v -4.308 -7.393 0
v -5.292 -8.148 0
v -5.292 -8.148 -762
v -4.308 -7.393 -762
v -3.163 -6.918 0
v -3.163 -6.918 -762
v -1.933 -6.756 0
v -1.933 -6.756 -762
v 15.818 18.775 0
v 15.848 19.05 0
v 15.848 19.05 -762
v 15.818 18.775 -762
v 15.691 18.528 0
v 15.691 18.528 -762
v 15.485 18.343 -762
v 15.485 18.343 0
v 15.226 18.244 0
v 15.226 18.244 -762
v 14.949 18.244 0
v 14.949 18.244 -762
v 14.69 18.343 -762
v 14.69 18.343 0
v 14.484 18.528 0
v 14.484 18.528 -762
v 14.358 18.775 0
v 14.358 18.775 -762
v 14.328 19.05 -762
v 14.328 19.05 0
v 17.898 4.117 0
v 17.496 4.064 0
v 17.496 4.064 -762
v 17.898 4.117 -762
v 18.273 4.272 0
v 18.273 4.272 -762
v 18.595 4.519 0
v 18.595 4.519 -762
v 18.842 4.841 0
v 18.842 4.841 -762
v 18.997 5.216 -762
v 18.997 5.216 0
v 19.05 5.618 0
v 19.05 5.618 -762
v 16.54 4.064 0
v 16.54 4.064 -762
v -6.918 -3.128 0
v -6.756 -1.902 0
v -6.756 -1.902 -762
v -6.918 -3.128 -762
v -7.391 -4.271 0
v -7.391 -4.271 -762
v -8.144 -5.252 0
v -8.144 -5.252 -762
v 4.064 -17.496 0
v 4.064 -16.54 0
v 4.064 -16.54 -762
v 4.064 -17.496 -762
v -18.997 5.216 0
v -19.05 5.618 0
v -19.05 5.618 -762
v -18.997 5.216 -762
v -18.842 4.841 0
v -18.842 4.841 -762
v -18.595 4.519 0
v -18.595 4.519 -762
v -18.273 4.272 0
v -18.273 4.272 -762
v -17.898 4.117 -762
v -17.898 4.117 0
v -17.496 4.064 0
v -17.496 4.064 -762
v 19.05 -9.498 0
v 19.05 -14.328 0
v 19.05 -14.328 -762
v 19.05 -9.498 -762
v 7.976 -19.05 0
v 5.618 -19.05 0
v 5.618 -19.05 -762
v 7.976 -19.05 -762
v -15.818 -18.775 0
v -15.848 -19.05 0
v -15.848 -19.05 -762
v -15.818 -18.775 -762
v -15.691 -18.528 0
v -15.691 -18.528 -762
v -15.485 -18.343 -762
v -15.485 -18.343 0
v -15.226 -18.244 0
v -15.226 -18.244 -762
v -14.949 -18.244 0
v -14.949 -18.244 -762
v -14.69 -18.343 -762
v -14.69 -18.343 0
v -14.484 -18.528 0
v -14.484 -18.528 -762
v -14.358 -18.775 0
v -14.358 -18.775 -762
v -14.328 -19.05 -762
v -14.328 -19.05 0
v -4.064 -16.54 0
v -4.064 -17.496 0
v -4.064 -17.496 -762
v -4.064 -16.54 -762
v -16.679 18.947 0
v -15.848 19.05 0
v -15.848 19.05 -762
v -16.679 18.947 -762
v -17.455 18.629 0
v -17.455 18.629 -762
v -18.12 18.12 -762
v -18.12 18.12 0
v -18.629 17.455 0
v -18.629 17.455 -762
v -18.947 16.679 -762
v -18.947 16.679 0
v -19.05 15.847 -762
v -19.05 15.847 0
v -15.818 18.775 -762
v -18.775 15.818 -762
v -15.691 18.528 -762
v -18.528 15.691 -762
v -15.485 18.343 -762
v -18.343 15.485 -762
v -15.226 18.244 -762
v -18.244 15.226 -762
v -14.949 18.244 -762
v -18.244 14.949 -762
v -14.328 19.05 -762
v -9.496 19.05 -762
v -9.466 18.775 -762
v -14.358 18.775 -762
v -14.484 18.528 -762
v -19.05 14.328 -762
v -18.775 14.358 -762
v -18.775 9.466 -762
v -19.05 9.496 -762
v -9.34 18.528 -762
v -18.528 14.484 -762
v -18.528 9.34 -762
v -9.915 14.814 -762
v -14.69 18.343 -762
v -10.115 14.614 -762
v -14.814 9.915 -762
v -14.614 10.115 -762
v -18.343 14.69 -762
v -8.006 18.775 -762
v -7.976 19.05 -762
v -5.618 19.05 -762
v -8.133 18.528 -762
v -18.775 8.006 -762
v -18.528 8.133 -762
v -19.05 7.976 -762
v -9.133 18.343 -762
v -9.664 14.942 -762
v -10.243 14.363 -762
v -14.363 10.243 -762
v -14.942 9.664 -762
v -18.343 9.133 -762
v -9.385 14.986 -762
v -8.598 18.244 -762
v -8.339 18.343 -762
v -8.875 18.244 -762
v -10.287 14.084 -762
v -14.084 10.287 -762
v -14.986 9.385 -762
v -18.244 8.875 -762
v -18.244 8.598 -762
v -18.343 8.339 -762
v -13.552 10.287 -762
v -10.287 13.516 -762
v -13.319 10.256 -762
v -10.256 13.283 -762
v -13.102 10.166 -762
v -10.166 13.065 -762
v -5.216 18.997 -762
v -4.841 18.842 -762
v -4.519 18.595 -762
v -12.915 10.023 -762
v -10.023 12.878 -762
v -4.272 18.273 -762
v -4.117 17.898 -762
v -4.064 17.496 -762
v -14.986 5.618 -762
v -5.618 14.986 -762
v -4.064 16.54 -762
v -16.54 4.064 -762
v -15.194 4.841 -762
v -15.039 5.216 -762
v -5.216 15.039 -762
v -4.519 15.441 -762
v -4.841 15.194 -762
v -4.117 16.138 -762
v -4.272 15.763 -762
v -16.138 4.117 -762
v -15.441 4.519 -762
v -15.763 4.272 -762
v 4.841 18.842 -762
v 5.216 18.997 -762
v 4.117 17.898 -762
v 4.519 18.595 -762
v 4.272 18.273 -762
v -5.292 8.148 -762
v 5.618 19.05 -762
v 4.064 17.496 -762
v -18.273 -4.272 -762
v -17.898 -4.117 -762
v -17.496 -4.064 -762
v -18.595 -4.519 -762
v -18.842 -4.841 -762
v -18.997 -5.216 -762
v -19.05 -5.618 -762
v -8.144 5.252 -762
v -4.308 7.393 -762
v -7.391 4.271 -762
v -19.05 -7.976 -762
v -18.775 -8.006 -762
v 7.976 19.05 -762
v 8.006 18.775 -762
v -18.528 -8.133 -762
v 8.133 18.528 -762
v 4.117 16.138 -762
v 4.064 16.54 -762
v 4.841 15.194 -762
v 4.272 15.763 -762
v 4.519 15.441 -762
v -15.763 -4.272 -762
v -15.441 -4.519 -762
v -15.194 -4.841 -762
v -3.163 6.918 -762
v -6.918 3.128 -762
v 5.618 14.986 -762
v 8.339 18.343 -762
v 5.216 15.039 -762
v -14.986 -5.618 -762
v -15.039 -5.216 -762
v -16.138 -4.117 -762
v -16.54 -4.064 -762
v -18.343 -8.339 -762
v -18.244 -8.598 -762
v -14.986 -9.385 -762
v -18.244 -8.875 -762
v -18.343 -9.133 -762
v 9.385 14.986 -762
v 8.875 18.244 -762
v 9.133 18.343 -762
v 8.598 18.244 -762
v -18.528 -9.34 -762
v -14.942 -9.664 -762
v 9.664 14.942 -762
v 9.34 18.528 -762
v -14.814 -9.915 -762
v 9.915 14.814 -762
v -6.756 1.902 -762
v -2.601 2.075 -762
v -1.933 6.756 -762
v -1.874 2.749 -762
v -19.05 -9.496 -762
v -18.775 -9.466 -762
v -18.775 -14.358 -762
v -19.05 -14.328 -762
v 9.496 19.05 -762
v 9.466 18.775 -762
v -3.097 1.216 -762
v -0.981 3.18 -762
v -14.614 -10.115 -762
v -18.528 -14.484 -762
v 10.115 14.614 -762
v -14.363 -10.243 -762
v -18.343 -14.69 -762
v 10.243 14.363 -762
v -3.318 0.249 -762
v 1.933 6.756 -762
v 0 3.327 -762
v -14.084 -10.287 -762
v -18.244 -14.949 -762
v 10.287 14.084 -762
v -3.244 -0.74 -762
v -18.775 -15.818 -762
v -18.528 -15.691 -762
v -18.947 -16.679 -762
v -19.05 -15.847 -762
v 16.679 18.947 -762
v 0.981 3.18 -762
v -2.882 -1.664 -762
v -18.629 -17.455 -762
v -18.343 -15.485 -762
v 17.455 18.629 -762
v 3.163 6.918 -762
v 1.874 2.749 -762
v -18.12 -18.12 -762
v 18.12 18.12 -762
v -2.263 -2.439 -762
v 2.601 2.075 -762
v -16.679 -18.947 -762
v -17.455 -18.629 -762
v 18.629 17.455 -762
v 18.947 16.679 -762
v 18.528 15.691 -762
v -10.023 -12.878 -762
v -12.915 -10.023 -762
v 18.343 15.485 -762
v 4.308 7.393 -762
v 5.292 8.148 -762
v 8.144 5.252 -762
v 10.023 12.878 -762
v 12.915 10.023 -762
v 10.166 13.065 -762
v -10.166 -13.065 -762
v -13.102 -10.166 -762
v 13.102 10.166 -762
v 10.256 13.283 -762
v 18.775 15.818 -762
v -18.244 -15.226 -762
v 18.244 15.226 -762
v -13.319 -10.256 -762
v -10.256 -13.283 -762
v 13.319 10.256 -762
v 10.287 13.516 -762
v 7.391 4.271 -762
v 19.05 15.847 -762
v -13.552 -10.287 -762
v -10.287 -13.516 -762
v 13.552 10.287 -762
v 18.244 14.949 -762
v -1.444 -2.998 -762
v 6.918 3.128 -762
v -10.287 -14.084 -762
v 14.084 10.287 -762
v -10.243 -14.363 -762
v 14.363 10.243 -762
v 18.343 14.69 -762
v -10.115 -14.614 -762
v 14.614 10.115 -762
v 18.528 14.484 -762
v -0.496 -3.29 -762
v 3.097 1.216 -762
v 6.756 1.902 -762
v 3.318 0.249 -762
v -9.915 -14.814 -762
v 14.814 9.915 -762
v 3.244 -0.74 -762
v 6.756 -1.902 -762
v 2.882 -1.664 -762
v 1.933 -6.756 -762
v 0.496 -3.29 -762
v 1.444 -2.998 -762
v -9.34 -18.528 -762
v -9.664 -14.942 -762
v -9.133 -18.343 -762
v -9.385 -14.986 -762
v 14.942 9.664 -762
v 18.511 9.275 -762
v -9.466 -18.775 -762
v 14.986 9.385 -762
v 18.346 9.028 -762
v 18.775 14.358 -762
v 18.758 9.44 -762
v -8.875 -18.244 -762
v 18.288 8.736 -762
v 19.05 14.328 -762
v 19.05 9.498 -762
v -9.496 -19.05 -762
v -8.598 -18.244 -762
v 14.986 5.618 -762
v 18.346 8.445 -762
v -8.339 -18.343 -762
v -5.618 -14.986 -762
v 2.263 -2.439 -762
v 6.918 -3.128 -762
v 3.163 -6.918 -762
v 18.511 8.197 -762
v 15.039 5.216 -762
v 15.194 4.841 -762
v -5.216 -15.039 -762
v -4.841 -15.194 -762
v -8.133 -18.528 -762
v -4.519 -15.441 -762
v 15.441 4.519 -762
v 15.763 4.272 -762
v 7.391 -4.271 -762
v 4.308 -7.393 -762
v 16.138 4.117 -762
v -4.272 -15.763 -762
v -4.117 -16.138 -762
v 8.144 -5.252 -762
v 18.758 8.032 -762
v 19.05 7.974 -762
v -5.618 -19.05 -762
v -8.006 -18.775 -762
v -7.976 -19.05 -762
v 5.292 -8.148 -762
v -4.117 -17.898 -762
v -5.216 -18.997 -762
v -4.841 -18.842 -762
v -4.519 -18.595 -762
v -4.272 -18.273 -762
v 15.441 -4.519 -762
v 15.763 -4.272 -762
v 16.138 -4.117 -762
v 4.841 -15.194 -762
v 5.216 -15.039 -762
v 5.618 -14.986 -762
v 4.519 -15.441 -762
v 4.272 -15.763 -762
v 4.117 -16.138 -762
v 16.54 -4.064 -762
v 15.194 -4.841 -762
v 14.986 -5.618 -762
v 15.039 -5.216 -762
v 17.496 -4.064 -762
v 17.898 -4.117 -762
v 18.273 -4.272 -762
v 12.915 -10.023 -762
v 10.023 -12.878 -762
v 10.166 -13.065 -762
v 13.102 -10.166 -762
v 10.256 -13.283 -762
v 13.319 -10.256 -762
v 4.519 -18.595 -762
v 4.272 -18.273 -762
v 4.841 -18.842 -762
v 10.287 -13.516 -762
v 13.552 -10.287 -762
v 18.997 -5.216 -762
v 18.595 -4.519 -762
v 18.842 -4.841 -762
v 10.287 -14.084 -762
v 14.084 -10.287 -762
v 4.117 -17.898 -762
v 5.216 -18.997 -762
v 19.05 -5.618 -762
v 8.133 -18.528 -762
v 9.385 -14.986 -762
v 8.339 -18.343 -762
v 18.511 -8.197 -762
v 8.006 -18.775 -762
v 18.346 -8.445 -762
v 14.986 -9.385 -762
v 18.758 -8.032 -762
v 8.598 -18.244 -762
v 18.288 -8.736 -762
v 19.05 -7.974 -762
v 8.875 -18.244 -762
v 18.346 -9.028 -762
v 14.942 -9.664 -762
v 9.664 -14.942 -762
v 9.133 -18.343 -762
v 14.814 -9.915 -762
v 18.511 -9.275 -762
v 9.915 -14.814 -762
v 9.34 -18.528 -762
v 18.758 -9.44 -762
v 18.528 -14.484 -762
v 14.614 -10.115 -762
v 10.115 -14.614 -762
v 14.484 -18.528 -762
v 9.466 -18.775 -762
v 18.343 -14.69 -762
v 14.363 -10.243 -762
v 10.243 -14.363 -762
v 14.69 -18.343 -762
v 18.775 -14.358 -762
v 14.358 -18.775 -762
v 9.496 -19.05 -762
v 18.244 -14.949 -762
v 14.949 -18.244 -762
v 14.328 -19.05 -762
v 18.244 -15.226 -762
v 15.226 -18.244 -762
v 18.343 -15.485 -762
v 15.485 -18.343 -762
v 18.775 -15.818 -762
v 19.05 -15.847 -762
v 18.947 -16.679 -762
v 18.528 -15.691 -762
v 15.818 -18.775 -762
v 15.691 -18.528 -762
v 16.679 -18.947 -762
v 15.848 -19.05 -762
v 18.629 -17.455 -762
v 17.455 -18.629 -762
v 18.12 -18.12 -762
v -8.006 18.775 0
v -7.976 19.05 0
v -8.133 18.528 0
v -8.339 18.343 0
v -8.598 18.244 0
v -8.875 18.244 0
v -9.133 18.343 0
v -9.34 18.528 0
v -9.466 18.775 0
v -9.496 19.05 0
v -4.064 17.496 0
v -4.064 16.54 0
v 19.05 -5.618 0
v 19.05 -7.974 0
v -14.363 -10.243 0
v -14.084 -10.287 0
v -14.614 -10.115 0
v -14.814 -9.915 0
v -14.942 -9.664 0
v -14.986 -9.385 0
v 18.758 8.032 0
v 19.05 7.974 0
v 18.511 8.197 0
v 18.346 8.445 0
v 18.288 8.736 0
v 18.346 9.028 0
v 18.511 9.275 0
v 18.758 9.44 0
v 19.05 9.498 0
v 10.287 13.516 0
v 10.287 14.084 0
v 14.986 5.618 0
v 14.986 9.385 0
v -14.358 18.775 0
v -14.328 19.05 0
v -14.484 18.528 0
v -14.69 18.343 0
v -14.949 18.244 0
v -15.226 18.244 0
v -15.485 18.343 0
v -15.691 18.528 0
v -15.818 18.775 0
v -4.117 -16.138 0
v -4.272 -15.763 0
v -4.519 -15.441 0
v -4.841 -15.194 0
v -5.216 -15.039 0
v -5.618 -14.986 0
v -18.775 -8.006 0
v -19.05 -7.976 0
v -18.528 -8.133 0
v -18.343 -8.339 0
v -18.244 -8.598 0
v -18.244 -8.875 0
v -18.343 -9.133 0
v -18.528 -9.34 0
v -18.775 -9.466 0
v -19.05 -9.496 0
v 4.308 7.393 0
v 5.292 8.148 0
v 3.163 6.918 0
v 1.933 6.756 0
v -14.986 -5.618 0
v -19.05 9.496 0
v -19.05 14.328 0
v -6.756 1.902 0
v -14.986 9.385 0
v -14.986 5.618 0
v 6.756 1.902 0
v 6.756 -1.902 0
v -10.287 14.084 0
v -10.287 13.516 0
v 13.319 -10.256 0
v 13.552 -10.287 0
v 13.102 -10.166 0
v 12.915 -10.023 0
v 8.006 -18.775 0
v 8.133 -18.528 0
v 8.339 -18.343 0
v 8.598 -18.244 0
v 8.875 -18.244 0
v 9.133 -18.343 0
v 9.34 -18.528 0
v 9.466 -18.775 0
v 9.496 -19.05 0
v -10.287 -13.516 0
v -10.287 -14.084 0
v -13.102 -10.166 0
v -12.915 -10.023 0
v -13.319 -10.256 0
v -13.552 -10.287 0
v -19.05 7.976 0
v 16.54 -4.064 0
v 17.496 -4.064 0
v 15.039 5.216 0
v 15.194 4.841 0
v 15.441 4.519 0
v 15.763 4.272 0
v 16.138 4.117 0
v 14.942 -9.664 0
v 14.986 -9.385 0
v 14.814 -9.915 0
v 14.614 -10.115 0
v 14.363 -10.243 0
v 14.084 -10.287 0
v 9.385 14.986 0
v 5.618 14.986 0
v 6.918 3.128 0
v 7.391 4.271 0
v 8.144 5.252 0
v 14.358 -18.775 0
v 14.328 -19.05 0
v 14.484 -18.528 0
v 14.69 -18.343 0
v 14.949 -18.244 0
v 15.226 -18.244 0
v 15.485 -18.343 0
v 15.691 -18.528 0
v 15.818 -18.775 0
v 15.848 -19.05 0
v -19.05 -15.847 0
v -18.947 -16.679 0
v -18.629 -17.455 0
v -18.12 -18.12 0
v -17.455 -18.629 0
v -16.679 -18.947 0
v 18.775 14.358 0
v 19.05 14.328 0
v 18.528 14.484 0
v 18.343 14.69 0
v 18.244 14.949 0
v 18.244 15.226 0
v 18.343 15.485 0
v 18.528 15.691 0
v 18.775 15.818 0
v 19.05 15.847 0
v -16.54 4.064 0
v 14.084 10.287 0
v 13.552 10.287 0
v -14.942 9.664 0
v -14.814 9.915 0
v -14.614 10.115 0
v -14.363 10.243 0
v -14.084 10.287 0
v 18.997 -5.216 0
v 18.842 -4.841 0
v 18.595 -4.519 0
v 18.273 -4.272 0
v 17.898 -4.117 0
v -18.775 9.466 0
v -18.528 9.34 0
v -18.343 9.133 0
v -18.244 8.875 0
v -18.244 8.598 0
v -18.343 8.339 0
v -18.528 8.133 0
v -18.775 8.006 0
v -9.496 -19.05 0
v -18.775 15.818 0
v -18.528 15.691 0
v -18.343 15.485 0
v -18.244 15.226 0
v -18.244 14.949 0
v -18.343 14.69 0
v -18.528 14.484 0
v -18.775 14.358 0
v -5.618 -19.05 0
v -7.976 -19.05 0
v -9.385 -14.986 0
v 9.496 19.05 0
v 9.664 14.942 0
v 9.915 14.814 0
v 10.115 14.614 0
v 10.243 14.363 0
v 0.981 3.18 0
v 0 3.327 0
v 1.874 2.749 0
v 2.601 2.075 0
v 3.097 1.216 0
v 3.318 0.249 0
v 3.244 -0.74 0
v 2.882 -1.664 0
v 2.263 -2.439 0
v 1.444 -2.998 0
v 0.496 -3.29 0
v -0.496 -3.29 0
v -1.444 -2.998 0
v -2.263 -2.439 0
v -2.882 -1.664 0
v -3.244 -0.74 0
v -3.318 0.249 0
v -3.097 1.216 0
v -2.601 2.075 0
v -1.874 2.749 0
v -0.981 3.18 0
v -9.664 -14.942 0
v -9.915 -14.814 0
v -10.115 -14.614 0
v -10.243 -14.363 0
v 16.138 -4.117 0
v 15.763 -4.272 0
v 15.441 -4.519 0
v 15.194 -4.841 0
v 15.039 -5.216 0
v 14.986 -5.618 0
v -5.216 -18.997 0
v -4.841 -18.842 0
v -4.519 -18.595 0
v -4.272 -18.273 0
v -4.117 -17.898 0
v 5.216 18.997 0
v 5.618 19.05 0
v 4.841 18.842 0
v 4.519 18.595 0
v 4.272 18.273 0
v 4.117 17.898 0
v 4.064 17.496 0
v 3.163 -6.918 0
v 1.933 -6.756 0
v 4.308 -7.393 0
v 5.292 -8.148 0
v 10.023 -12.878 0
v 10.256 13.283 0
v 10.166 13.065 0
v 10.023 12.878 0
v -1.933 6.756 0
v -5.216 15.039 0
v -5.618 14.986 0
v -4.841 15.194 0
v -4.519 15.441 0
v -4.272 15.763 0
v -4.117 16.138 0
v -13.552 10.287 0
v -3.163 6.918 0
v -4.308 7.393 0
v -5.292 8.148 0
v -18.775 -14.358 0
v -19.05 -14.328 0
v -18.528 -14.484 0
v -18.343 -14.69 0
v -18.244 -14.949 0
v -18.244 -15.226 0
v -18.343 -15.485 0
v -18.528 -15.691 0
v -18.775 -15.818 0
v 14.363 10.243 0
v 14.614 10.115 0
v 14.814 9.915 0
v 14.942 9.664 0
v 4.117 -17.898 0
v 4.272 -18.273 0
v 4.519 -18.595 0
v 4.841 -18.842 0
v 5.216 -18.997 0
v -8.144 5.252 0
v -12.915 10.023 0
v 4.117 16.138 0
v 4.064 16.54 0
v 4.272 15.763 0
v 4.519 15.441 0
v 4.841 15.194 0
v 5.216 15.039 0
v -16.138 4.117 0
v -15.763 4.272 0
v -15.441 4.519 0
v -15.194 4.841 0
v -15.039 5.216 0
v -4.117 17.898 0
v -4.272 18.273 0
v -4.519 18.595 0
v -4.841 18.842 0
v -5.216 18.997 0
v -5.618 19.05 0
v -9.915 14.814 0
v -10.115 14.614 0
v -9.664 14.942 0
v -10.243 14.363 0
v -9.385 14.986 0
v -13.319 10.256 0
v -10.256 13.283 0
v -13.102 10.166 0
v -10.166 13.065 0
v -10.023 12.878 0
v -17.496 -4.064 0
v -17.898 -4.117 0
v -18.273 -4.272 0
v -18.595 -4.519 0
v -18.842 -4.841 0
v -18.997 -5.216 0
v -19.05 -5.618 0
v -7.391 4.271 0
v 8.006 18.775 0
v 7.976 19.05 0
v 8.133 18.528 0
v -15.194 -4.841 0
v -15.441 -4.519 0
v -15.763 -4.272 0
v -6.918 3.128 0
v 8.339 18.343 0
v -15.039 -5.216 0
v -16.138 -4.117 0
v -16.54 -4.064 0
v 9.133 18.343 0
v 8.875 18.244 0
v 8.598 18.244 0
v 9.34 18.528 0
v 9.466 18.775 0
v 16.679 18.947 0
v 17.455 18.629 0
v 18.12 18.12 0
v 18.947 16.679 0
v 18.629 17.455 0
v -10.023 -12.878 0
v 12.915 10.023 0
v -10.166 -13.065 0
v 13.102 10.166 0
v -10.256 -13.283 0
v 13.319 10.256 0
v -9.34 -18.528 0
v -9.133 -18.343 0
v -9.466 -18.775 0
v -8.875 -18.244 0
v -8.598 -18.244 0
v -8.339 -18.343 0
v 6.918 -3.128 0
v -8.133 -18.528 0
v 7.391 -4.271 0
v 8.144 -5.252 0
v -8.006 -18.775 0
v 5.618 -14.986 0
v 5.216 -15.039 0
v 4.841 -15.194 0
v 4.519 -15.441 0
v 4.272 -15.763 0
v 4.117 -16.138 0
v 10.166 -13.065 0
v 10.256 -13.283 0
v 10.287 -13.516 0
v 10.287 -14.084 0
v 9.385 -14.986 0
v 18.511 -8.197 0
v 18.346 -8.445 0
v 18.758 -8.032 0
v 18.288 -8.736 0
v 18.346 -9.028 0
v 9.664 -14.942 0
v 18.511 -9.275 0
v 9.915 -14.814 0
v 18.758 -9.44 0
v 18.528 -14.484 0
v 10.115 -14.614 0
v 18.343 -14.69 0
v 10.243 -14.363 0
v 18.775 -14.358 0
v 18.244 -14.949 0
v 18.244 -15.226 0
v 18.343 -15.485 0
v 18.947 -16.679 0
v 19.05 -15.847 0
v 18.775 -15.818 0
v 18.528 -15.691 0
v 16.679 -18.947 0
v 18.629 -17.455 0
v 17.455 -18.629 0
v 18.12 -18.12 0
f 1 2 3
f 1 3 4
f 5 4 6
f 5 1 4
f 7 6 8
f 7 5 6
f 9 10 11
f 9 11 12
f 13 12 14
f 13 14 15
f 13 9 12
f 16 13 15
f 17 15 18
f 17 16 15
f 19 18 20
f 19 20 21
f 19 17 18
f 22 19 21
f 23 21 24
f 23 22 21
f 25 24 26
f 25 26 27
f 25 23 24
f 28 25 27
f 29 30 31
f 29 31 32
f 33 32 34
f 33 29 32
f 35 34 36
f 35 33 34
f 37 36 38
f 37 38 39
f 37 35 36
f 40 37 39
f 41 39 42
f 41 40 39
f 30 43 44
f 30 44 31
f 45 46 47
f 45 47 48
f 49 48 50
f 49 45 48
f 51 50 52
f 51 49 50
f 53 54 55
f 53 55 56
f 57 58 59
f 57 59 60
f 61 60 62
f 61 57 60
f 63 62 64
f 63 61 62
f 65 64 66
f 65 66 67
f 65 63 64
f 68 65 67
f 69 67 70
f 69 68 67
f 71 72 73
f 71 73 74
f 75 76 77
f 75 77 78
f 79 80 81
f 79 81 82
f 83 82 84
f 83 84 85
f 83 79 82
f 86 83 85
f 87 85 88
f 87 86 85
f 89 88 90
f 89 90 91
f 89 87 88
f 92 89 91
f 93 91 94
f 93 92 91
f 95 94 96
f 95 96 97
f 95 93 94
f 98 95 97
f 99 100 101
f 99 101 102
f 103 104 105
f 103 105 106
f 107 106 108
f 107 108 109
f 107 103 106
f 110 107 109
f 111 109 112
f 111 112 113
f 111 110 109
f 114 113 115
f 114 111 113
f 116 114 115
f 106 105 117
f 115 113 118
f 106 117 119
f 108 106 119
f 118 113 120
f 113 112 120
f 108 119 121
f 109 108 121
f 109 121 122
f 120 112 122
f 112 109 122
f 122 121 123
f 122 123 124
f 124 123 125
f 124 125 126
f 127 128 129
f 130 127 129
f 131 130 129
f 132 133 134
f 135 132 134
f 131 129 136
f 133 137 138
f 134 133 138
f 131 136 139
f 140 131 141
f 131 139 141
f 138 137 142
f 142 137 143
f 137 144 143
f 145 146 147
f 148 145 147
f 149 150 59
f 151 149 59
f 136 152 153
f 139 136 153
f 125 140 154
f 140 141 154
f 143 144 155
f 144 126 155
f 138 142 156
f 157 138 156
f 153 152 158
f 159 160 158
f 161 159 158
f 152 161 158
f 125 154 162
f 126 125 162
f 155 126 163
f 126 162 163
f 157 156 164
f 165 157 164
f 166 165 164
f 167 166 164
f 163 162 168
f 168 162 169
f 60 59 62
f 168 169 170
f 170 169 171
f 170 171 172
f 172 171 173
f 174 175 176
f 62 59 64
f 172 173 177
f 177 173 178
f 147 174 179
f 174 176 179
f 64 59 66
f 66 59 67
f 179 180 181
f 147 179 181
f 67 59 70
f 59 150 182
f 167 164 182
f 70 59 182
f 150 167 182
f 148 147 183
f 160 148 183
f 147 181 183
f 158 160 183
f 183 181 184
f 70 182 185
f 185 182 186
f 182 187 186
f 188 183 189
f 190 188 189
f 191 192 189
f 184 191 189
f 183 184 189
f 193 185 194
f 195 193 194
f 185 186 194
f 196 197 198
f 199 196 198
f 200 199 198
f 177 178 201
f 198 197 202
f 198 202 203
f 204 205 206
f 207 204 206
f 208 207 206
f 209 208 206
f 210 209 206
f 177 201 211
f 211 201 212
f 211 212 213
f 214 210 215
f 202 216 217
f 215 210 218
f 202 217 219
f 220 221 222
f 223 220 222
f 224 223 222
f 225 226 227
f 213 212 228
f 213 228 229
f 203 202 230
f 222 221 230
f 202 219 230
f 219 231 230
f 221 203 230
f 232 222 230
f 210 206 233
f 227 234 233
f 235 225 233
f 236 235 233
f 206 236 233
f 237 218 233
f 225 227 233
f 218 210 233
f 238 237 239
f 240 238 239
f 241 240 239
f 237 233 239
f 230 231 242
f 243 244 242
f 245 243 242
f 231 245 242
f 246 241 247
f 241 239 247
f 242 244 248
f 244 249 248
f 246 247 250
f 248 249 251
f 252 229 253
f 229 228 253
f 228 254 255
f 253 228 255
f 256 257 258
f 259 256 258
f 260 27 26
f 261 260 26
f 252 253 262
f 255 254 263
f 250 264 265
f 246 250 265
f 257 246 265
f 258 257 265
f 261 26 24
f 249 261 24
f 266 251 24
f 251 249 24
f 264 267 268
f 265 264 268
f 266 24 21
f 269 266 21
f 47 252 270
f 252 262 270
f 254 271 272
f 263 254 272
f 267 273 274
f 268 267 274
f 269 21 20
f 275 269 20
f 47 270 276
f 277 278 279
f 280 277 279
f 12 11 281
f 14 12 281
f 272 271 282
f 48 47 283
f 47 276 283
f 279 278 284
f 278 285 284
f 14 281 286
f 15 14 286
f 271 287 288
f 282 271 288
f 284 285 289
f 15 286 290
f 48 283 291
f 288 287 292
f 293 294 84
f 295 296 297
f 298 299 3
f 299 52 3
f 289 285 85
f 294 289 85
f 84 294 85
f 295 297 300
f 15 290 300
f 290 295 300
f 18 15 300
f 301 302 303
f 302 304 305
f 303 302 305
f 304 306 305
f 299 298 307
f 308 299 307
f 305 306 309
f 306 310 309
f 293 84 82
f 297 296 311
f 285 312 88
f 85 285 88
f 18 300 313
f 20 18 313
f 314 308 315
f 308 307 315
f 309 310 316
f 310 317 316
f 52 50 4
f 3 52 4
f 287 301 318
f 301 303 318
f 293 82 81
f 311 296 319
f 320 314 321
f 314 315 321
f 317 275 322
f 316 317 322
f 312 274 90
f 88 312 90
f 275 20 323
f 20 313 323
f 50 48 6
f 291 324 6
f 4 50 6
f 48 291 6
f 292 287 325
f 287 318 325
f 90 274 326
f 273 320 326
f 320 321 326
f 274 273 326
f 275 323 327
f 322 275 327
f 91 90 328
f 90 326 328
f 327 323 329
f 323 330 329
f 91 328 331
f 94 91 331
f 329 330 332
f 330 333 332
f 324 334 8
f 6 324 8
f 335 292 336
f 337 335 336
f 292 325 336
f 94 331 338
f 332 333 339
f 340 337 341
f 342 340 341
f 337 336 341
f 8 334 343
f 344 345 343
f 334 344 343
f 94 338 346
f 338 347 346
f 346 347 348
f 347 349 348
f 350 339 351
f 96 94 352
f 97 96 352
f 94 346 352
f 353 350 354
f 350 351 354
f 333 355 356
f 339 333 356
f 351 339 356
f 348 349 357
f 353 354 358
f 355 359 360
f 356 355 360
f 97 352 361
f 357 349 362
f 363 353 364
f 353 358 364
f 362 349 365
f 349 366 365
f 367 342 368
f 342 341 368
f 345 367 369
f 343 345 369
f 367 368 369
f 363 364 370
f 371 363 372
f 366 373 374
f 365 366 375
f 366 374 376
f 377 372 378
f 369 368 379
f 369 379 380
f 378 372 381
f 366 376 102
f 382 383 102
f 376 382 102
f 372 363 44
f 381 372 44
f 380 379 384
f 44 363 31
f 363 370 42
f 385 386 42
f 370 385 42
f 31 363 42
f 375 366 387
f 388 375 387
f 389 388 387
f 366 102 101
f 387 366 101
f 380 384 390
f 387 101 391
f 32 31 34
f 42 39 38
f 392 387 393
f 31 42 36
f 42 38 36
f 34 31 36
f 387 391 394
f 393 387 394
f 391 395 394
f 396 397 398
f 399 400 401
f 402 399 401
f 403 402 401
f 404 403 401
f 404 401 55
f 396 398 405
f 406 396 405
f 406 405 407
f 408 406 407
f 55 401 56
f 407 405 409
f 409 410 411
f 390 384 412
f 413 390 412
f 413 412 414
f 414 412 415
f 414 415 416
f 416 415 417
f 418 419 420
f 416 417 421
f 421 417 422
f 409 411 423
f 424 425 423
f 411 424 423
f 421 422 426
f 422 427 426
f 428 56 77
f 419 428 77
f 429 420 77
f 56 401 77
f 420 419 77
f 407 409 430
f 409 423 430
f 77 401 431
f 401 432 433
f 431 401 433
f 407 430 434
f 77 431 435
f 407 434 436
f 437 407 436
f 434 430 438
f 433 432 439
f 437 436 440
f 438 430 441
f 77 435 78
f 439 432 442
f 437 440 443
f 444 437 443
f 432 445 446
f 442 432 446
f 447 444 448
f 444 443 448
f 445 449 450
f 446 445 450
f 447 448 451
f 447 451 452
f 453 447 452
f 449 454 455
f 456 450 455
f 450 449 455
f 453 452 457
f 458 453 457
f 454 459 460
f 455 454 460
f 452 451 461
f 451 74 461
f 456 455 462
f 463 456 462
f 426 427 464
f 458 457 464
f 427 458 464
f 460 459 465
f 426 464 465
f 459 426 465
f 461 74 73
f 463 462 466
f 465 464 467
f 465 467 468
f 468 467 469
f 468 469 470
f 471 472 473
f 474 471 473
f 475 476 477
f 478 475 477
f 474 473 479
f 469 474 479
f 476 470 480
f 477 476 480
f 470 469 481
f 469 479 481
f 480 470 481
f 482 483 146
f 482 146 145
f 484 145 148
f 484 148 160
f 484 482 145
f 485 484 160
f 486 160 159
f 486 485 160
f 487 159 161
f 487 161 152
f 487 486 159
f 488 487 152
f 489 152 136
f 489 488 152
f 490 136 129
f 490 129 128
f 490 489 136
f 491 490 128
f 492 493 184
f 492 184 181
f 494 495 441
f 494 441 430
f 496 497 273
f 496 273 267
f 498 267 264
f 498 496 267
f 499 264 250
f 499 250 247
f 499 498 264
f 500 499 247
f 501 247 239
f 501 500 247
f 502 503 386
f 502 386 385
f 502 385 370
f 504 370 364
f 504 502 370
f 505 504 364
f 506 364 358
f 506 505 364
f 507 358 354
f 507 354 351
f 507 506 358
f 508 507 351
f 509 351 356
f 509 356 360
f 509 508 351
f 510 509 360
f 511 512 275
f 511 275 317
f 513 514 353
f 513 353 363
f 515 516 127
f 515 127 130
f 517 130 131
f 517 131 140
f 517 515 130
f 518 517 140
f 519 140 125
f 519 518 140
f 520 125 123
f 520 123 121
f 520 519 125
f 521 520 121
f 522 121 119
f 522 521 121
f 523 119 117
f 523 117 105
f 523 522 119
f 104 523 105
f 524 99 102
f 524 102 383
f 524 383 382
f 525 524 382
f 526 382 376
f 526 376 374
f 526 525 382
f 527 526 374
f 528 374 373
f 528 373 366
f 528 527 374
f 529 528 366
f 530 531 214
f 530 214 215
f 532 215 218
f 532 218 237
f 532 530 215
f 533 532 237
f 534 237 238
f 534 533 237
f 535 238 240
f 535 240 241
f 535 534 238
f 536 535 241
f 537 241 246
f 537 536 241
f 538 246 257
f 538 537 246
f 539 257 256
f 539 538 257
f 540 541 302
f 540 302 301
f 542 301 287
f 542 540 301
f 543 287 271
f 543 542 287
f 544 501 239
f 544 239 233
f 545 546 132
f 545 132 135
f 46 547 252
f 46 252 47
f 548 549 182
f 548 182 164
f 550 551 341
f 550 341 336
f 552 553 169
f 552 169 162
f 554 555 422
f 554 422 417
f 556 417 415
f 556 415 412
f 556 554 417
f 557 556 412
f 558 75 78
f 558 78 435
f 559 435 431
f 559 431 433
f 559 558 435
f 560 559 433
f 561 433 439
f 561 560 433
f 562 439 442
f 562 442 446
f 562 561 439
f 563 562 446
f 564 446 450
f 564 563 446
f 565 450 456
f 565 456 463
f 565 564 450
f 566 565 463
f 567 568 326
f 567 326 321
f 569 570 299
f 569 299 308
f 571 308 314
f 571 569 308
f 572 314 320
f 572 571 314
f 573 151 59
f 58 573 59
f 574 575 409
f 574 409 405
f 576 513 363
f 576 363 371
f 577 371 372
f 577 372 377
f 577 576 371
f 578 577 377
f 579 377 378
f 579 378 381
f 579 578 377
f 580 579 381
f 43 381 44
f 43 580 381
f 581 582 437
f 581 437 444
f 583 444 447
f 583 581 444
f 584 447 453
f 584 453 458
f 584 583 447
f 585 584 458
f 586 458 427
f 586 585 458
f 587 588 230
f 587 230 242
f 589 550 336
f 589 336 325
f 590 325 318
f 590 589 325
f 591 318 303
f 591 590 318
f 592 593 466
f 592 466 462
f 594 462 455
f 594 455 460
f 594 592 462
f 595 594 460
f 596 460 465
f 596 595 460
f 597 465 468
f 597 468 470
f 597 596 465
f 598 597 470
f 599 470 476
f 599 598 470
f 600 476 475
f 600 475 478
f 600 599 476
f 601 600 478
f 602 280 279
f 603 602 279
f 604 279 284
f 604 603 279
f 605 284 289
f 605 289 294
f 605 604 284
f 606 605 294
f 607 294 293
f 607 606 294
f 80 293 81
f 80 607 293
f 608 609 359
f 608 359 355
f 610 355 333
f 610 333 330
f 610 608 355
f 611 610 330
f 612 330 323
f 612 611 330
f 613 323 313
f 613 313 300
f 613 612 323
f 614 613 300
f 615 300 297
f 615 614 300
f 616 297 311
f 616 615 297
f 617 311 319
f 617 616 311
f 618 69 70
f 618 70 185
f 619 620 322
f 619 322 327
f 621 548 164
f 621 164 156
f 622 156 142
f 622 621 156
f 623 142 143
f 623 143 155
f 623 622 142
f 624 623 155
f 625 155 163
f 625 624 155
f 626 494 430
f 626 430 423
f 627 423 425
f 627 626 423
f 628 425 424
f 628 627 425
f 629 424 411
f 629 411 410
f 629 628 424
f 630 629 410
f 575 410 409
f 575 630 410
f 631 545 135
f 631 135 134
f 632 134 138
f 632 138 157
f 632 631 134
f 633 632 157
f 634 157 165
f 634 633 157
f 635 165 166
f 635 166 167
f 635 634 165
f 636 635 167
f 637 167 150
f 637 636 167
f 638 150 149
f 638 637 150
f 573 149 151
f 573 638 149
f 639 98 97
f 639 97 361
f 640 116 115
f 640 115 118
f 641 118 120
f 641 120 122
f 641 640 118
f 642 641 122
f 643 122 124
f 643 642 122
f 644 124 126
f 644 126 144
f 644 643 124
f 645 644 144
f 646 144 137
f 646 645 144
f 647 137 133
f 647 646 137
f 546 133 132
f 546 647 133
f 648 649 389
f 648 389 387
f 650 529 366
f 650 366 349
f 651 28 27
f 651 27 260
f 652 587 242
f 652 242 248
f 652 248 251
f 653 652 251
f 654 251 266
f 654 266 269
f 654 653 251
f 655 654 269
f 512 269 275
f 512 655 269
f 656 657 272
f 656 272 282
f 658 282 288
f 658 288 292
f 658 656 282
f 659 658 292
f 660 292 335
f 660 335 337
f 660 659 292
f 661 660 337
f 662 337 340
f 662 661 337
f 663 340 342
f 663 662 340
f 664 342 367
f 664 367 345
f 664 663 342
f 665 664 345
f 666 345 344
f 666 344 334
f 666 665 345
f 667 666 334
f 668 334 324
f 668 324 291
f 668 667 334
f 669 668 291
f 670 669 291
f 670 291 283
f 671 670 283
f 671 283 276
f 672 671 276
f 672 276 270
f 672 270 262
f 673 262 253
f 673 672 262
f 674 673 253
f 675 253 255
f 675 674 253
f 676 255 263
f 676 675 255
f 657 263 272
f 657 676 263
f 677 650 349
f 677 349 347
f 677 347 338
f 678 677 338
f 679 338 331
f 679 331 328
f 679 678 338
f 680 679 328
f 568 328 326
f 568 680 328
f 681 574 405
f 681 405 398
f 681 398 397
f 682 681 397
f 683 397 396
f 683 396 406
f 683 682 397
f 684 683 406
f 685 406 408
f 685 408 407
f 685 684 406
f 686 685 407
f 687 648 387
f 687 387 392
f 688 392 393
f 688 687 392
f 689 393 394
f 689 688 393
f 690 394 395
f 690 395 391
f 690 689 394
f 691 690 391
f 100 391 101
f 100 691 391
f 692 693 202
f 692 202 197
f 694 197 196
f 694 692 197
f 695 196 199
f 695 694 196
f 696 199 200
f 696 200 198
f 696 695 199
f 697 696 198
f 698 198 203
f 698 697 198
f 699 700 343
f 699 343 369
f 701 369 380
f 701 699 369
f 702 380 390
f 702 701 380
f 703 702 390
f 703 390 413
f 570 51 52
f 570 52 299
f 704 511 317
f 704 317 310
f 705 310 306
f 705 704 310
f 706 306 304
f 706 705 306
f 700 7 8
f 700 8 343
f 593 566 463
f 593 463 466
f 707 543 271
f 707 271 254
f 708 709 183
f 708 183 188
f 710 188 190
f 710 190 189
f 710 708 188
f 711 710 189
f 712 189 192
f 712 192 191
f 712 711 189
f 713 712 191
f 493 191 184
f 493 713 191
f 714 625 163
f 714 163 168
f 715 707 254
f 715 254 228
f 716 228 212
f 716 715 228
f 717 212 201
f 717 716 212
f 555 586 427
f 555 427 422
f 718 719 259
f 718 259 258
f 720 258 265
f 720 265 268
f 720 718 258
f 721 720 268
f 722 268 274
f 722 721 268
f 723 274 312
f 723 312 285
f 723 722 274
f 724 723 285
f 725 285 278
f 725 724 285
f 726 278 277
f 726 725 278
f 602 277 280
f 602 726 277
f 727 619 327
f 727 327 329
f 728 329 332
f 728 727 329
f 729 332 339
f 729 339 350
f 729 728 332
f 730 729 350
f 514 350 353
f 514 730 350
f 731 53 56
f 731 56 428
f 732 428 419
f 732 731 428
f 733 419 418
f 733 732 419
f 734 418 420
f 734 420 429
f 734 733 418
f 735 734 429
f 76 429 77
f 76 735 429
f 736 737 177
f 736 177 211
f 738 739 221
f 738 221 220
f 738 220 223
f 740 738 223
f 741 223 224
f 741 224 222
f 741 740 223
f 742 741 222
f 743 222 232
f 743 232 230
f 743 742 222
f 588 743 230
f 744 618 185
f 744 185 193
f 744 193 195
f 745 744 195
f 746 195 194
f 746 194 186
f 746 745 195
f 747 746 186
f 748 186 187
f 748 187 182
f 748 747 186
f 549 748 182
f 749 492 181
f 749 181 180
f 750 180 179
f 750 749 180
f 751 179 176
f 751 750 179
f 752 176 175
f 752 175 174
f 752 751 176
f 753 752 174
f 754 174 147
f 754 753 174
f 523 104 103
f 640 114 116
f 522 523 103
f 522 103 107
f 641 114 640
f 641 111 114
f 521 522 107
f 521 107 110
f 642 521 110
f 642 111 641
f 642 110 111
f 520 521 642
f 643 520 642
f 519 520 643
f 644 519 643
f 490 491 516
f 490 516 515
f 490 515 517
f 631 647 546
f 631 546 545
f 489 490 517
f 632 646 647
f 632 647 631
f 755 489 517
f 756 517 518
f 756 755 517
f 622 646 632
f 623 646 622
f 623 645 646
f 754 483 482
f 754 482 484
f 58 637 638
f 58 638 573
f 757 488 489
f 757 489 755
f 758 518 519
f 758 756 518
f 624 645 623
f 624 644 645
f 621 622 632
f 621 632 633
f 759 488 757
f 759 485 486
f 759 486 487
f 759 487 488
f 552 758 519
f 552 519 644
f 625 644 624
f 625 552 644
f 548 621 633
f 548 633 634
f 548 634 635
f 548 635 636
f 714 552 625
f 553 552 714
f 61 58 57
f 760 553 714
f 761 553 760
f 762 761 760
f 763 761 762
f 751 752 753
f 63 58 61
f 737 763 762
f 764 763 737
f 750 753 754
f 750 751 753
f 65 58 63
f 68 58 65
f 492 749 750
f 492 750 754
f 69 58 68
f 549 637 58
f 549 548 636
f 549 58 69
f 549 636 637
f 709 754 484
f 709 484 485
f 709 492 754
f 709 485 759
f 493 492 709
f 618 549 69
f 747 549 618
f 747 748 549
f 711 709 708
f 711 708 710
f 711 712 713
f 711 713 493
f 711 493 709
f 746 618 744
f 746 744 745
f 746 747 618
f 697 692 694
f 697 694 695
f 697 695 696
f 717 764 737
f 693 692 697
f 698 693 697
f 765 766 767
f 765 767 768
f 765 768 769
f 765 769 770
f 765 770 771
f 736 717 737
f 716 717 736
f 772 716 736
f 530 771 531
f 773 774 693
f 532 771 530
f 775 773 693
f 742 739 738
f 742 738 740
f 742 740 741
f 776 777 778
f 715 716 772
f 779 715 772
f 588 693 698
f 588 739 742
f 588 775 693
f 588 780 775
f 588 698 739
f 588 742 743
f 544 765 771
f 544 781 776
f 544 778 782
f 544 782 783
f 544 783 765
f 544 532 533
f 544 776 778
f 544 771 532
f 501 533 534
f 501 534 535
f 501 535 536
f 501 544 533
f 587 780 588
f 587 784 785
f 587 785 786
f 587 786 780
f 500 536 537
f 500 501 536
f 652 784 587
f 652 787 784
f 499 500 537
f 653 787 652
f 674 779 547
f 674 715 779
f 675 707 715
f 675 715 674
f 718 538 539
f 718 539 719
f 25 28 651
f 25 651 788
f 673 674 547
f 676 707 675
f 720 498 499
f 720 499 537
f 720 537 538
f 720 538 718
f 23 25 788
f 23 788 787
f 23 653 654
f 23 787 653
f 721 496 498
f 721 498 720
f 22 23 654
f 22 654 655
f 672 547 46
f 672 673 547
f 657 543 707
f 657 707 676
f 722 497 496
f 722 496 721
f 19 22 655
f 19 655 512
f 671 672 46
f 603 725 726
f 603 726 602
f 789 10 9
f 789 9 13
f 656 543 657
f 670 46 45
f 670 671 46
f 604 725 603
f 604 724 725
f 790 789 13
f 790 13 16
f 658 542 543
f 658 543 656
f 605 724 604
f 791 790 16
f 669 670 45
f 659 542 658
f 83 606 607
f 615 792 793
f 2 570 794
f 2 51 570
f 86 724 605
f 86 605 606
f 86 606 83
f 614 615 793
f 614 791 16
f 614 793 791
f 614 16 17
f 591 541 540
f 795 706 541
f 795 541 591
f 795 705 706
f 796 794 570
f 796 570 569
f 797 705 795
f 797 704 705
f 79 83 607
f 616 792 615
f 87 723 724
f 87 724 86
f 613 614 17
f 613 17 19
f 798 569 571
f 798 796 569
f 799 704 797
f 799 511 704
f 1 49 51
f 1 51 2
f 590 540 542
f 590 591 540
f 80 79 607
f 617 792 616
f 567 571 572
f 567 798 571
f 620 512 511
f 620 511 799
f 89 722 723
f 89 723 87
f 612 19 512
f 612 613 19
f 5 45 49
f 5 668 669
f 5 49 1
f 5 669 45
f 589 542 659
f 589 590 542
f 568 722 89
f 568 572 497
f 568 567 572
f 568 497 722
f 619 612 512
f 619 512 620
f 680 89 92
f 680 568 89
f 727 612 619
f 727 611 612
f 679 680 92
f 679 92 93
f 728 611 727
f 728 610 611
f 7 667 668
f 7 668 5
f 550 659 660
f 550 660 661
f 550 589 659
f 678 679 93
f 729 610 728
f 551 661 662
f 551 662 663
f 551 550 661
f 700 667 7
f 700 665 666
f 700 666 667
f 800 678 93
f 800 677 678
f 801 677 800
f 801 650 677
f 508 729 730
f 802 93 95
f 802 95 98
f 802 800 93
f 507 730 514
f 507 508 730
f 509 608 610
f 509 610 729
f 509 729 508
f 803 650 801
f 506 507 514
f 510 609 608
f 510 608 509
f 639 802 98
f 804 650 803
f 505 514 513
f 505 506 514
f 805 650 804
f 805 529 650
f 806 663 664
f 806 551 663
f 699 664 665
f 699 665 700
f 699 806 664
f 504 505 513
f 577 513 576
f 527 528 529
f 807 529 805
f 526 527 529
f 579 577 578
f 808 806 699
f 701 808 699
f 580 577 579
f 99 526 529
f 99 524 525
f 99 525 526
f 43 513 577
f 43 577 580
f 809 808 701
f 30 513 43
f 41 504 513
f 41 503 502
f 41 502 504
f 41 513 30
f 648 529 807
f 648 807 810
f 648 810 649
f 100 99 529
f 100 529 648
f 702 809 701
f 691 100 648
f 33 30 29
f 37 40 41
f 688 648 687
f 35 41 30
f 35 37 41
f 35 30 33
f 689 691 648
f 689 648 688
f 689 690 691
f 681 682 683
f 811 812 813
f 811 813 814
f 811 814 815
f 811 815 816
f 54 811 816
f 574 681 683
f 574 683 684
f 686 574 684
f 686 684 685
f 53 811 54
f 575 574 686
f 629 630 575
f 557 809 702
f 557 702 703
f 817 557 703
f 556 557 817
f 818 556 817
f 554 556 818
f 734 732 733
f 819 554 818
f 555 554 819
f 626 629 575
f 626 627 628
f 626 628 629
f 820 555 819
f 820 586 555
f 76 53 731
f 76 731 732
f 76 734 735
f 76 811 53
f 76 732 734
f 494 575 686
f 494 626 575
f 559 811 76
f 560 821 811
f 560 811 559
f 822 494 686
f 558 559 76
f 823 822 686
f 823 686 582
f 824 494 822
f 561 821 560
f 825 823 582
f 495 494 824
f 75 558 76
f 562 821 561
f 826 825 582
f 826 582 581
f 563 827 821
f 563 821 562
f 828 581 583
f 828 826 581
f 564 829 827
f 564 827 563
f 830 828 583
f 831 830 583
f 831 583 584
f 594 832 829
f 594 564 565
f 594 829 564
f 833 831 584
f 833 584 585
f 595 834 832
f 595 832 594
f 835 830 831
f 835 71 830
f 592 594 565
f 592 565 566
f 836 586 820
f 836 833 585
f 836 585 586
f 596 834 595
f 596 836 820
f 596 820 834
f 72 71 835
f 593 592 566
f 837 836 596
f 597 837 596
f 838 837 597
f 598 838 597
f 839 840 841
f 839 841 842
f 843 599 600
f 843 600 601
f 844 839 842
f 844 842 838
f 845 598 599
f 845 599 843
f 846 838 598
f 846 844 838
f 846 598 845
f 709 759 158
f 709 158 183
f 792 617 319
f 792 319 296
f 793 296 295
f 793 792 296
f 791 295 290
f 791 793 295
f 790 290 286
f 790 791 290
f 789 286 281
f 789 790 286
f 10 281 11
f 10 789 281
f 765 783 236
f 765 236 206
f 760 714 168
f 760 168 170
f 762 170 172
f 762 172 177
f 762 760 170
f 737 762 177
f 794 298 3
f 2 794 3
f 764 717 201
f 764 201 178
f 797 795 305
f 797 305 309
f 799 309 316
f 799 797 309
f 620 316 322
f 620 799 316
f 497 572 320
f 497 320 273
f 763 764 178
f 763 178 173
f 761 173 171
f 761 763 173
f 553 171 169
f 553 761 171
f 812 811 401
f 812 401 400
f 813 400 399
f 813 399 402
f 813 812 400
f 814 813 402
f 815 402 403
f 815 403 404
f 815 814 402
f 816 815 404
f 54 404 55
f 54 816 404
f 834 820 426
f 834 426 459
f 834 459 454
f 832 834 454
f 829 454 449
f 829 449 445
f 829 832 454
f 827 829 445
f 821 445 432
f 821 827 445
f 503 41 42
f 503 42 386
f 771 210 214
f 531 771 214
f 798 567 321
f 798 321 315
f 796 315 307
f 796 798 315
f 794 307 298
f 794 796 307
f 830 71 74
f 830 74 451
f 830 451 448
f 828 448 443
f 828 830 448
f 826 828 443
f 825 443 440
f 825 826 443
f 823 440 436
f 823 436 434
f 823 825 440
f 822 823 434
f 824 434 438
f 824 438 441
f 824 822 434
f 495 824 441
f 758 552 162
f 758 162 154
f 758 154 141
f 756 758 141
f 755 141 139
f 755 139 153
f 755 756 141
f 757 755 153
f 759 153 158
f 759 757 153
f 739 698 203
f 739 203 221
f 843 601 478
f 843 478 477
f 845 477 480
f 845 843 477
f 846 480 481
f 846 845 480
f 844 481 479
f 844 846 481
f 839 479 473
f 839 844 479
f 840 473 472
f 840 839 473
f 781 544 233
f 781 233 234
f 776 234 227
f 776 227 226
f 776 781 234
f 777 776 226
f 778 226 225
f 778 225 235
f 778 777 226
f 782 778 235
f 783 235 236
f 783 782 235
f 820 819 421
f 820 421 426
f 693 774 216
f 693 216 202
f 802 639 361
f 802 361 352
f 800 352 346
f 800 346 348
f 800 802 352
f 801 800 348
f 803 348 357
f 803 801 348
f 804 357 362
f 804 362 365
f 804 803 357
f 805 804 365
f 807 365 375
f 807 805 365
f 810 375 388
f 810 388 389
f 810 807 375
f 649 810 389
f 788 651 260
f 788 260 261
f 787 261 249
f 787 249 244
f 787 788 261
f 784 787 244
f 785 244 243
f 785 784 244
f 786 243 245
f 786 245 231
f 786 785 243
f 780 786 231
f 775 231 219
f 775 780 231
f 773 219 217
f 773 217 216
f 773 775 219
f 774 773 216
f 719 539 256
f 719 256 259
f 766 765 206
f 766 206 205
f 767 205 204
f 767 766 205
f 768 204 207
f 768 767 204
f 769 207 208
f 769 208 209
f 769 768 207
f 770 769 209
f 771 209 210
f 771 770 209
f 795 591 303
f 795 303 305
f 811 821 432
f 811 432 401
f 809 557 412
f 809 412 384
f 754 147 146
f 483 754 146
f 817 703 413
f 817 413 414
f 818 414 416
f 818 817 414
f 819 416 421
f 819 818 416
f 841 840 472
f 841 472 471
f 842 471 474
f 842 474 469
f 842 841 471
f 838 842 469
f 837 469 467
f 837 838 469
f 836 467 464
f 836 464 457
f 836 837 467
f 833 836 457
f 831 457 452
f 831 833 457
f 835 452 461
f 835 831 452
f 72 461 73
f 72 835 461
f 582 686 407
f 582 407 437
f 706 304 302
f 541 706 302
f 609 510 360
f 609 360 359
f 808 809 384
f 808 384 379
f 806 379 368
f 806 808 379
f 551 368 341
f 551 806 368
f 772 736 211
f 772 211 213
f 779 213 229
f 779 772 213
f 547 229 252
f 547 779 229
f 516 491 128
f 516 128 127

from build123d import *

# Parameters (mm, degrees)
SKETCH11_R                = 3.3274
F_15_1515_PROFILE_1_DEPTH = 762


with BuildPart() as part:
    # Sketch11 → 15 1515 PROFILE(1) (new body)
    with BuildSketch(Plane.YX):
        with BuildLine():
            Line((-10.022898969, 12.91475973), (-5.252158105, 8.144007132))
            ThreePointArc((-5.252158105, 8.144007132), (-3.715177372, 7.117027388), (-1.902183975, 6.7564))
            Line((-1.902183975, 6.7564), (1.902183975, 6.7564))
            ThreePointArc((1.902183975, 6.7564), (3.715177372, 7.117027388), (5.252158105, 8.144007132))
            Line((5.252158105, 8.144007132), (10.022898969, 12.91475973))
            ThreePointArc((10.022898969, 12.91475973), (10.218362387, 13.207291992), (10.287, 13.552357131))
            Line((10.287, 13.552357131), (10.287, 14.0843))
            ThreePointArc((10.287, 14.0843), (10.022898185, 14.721898185), (9.3853, 14.986))
            Line((9.3853, 14.986), (5.617617549, 14.986))
            ThreePointArc((5.617617549, 14.986), (4.519044045, 15.441044045), (4.064, 16.539617549))
            Line((4.064, 16.539617549), (4.064, 17.496382451))
            ThreePointArc((4.064, 17.496382451), (4.519044045, 18.594955955), (5.617617549, 19.05))
            Line((5.617617549, 19.05), (7.974178704, 19.05))
            ThreePointArc((7.974178704, 19.05), (8.736178704, 18.288), (9.498178704, 19.05))
            Line((9.498178704, 19.05), (14.327719207, 19.05))
            ThreePointArc((14.327719207, 19.05), (15.087603123, 18.231251131), (15.847487039, 19.05))
            ThreePointArc((15.847487039, 19.05), (18.120176289, 18.120192083), (19.05, 15.847509295))
            ThreePointArc((19.05, 15.847509295), (18.231250992, 15.08762539), (19.05, 14.327741484))
            Line((19.05, 14.327741484), (19.05, 9.496091471))
            ThreePointArc((19.05, 9.496091471), (18.231250992, 8.736207565), (19.05, 7.97632366))
            Line((19.05, 7.97632366), (19.05, 5.617617549))
            ThreePointArc((19.05, 5.617617549), (18.594955955, 4.519044045), (17.496382451, 4.064))
            Line((17.496382451, 4.064), (16.539617549, 4.064))
            ThreePointArc((16.539617549, 4.064), (15.441044045, 4.519044045), (14.986, 5.617617549))
            Line((14.986, 5.617617549), (14.986, 9.385342516))
            ThreePointArc((14.986, 9.385342516), (14.721898185, 10.022940701), (14.0843, 10.287042516))
            Line((14.0843, 10.287042516), (13.516042086, 10.287042516))
            ThreePointArc((13.516042086, 10.287042516), (13.170975923, 10.218404478), (12.878443117, 10.022939917))
            Line((12.878443117, 10.022939917), (8.14758008, 5.292065243))
            ThreePointArc((8.14758008, 5.292065243), (7.117955879, 3.751120653), (6.7564, 1.933453584))
            Line((6.7564, 1.933453584), (6.7564, -1.933453584))
            ThreePointArc((6.7564, -1.933453584), (7.117955879, -3.751120653), (8.14758008, -5.292065243))
            Line((8.14758008, -5.292065243), (12.878443117, -10.022939917))
            ThreePointArc((12.878443117, -10.022939917), (13.170975923, -10.218404478), (13.516042086, -10.287042516))
            Line((13.516042086, -10.287042516), (14.0843, -10.287042516))
            ThreePointArc((14.0843, -10.287042516), (14.721898185, -10.022940701), (14.986, -9.385342516))
            Line((14.986, -9.385342516), (14.986, -5.617617549))
            ThreePointArc((14.986, -5.617617549), (15.441044045, -4.519044045), (16.539617549, -4.064))
            Line((16.539617549, -4.064), (17.496382451, -4.064))
            ThreePointArc((17.496382451, -4.064), (18.594955955, -4.519044045), (19.05, -5.617617549))
            Line((19.05, -5.617617549), (19.05, -7.976318491))
            ThreePointArc((19.05, -7.976318491), (18.231250992, -8.736202396), (19.05, -9.496086302))
            Line((19.05, -9.496086302), (19.05, -14.32774291))
            ThreePointArc((19.05, -14.32774291), (18.231250992, -15.087626816), (19.05, -15.847510721))
            ThreePointArc((19.05, -15.847510721), (18.120175716, -18.120192644), (15.847486868, -19.05))
            ThreePointArc((15.847486868, -19.05), (15.087602952, -18.231251131), (14.327719036, -19.05))
            Line((14.327719036, -19.05), (9.496062448, -19.05))
            ThreePointArc((9.496062448, -19.05), (8.736178532, -18.231251131), (7.976294616, -19.05))
            Line((7.976294616, -19.05), (5.617617549, -19.05))
            ThreePointArc((5.617617549, -19.05), (4.519044045, -18.594955955), (4.064, -17.496382451))
            Line((4.064, -17.496382451), (4.064, -16.539617549))
            ThreePointArc((4.064, -16.539617549), (4.519044045, -15.441044045), (5.617617549, -14.986))
            Line((5.617617549, -14.986), (9.3853, -14.986))
            ThreePointArc((9.3853, -14.986), (10.022898185, -14.721898185), (10.287, -14.0843))
            Line((10.287, -14.0843), (10.287, -13.552357131))
            ThreePointArc((10.287, -13.552357131), (10.218362387, -13.207291992), (10.022898969, -12.91475973))
            Line((10.022898969, -12.91475973), (5.252158105, -8.144007132))
            ThreePointArc((5.252158105, -8.144007132), (3.715177372, -7.117027388), (1.902183975, -6.7564))
            Line((1.902183975, -6.7564), (-1.902183975, -6.7564))
            ThreePointArc((-1.902183975, -6.7564), (-3.715177372, -7.117027388), (-5.252158105, -8.144007132))
            Line((-5.252158105, -8.144007132), (-10.022898969, -12.91475973))
            ThreePointArc((-10.022898969, -12.91475973), (-10.218362387, -13.207291992), (-10.287, -13.552357131))
            Line((-10.287, -13.552357131), (-10.287, -14.0843))
            ThreePointArc((-10.287, -14.0843), (-10.022898185, -14.721898185), (-9.3853, -14.986))
            Line((-9.3853, -14.986), (-5.617617549, -14.986))
            ThreePointArc((-5.617617549, -14.986), (-4.519044045, -15.441044045), (-4.064, -16.539617549))
            Line((-4.064, -16.539617549), (-4.064, -17.496382451))
            ThreePointArc((-4.064, -17.496382451), (-4.519044045, -18.594955955), (-5.617617549, -19.05))
            Line((-5.617617549, -19.05), (-7.976294616, -19.05))
            ThreePointArc((-7.976294616, -19.05), (-8.736178532, -18.231251131), (-9.496062448, -19.05))
            Line((-9.496062448, -19.05), (-14.327719036, -19.05))
            ThreePointArc((-14.327719036, -19.05), (-15.087602952, -18.231251131), (-15.847486868, -19.05))
            ThreePointArc((-15.847486868, -19.05), (-18.120175716, -18.120192644), (-19.05, -15.847510721))
            ThreePointArc((-19.05, -15.847510721), (-18.231250992, -15.087626816), (-19.05, -14.32774291))
            Line((-19.05, -14.32774291), (-19.05, -9.496086302))
            ThreePointArc((-19.05, -9.496086302), (-18.231250992, -8.736202396), (-19.05, -7.976318491))
            Line((-19.05, -7.976318491), (-19.05, -5.617617549))
            ThreePointArc((-19.05, -5.617617549), (-18.594955955, -4.519044045), (-17.496382451, -4.064))
            Line((-17.496382451, -4.064), (-16.539617549, -4.064))
            ThreePointArc((-16.539617549, -4.064), (-15.441044045, -4.519044045), (-14.986, -5.617617549))
            Line((-14.986, -5.617617549), (-14.986, -9.385342516))
            ThreePointArc((-14.986, -9.385342516), (-14.721898185, -10.022940701), (-14.0843, -10.287042516))
            Line((-14.0843, -10.287042516), (-13.516042086, -10.287042516))
            ThreePointArc((-13.516042086, -10.287042516), (-13.170975923, -10.218404478), (-12.878443117, -10.022939917))
            Line((-12.878443117, -10.022939917), (-8.14758008, -5.292065243))
            ThreePointArc((-8.14758008, -5.292065243), (-7.117955879, -3.751120653), (-6.7564, -1.933453584))
            Line((-6.7564, -1.933453584), (-6.7564, 1.933453584))
            ThreePointArc((-6.7564, 1.933453584), (-7.117955879, 3.751120653), (-8.14758008, 5.292065243))
            Line((-8.14758008, 5.292065243), (-12.878443117, 10.022939917))
            ThreePointArc((-12.878443117, 10.022939917), (-13.170975923, 10.218404478), (-13.516042086, 10.287042516))
            Line((-13.516042086, 10.287042516), (-14.0843, 10.287042516))
            ThreePointArc((-14.0843, 10.287042516), (-14.721898185, 10.022940701), (-14.986, 9.385342516))
            Line((-14.986, 9.385342516), (-14.986, 5.617617549))
            ThreePointArc((-14.986, 5.617617549), (-15.441044045, 4.519044045), (-16.539617549, 4.064))
            Line((-16.539617549, 4.064), (-17.496382451, 4.064))
            ThreePointArc((-17.496382451, 4.064), (-18.594955955, 4.519044045), (-19.05, 5.617617549))
            Line((-19.05, 5.617617549), (-19.05, 7.97632366))
            ThreePointArc((-19.05, 7.97632366), (-18.231250992, 8.736207565), (-19.05, 9.496091471))
            Line((-19.05, 9.496091471), (-19.05, 14.327741484))
            ThreePointArc((-19.05, 14.327741484), (-18.231250992, 15.08762539), (-19.05, 15.847509295))
            ThreePointArc((-19.05, 15.847509295), (-18.120176289, 18.120192083), (-15.847487039, 19.05))
            ThreePointArc((-15.847487039, 19.05), (-15.087603123, 18.231251131), (-14.327719207, 19.05))
            Line((-14.327719207, 19.05), (-9.498178704, 19.05))
            ThreePointArc((-9.498178704, 19.05), (-8.736178704, 18.288), (-7.974178704, 19.05))
            Line((-7.974178704, 19.05), (-5.617617549, 19.05))
            ThreePointArc((-5.617617549, 19.05), (-4.519044045, 18.594955955), (-4.064, 17.496382451))
            Line((-4.064, 17.496382451), (-4.064, 16.539617549))
            ThreePointArc((-4.064, 16.539617549), (-4.519044045, 15.441044045), (-5.617617549, 14.986))
            Line((-5.617617549, 14.986), (-9.3853, 14.986))
            ThreePointArc((-9.3853, 14.986), (-10.022898185, 14.721898185), (-10.287, 14.0843))
            Line((-10.287, 14.0843), (-10.287, 13.552357131))
            ThreePointArc((-10.287, 13.552357131), (-10.218362387, 13.207291992), (-10.022898969, 12.91475973))
        make_face()
        Circle(SKETCH11_R, mode=Mode.SUBTRACT)
    extrude(amount=F_15_1515_PROFILE_1_DEPTH)


solid = part.part
